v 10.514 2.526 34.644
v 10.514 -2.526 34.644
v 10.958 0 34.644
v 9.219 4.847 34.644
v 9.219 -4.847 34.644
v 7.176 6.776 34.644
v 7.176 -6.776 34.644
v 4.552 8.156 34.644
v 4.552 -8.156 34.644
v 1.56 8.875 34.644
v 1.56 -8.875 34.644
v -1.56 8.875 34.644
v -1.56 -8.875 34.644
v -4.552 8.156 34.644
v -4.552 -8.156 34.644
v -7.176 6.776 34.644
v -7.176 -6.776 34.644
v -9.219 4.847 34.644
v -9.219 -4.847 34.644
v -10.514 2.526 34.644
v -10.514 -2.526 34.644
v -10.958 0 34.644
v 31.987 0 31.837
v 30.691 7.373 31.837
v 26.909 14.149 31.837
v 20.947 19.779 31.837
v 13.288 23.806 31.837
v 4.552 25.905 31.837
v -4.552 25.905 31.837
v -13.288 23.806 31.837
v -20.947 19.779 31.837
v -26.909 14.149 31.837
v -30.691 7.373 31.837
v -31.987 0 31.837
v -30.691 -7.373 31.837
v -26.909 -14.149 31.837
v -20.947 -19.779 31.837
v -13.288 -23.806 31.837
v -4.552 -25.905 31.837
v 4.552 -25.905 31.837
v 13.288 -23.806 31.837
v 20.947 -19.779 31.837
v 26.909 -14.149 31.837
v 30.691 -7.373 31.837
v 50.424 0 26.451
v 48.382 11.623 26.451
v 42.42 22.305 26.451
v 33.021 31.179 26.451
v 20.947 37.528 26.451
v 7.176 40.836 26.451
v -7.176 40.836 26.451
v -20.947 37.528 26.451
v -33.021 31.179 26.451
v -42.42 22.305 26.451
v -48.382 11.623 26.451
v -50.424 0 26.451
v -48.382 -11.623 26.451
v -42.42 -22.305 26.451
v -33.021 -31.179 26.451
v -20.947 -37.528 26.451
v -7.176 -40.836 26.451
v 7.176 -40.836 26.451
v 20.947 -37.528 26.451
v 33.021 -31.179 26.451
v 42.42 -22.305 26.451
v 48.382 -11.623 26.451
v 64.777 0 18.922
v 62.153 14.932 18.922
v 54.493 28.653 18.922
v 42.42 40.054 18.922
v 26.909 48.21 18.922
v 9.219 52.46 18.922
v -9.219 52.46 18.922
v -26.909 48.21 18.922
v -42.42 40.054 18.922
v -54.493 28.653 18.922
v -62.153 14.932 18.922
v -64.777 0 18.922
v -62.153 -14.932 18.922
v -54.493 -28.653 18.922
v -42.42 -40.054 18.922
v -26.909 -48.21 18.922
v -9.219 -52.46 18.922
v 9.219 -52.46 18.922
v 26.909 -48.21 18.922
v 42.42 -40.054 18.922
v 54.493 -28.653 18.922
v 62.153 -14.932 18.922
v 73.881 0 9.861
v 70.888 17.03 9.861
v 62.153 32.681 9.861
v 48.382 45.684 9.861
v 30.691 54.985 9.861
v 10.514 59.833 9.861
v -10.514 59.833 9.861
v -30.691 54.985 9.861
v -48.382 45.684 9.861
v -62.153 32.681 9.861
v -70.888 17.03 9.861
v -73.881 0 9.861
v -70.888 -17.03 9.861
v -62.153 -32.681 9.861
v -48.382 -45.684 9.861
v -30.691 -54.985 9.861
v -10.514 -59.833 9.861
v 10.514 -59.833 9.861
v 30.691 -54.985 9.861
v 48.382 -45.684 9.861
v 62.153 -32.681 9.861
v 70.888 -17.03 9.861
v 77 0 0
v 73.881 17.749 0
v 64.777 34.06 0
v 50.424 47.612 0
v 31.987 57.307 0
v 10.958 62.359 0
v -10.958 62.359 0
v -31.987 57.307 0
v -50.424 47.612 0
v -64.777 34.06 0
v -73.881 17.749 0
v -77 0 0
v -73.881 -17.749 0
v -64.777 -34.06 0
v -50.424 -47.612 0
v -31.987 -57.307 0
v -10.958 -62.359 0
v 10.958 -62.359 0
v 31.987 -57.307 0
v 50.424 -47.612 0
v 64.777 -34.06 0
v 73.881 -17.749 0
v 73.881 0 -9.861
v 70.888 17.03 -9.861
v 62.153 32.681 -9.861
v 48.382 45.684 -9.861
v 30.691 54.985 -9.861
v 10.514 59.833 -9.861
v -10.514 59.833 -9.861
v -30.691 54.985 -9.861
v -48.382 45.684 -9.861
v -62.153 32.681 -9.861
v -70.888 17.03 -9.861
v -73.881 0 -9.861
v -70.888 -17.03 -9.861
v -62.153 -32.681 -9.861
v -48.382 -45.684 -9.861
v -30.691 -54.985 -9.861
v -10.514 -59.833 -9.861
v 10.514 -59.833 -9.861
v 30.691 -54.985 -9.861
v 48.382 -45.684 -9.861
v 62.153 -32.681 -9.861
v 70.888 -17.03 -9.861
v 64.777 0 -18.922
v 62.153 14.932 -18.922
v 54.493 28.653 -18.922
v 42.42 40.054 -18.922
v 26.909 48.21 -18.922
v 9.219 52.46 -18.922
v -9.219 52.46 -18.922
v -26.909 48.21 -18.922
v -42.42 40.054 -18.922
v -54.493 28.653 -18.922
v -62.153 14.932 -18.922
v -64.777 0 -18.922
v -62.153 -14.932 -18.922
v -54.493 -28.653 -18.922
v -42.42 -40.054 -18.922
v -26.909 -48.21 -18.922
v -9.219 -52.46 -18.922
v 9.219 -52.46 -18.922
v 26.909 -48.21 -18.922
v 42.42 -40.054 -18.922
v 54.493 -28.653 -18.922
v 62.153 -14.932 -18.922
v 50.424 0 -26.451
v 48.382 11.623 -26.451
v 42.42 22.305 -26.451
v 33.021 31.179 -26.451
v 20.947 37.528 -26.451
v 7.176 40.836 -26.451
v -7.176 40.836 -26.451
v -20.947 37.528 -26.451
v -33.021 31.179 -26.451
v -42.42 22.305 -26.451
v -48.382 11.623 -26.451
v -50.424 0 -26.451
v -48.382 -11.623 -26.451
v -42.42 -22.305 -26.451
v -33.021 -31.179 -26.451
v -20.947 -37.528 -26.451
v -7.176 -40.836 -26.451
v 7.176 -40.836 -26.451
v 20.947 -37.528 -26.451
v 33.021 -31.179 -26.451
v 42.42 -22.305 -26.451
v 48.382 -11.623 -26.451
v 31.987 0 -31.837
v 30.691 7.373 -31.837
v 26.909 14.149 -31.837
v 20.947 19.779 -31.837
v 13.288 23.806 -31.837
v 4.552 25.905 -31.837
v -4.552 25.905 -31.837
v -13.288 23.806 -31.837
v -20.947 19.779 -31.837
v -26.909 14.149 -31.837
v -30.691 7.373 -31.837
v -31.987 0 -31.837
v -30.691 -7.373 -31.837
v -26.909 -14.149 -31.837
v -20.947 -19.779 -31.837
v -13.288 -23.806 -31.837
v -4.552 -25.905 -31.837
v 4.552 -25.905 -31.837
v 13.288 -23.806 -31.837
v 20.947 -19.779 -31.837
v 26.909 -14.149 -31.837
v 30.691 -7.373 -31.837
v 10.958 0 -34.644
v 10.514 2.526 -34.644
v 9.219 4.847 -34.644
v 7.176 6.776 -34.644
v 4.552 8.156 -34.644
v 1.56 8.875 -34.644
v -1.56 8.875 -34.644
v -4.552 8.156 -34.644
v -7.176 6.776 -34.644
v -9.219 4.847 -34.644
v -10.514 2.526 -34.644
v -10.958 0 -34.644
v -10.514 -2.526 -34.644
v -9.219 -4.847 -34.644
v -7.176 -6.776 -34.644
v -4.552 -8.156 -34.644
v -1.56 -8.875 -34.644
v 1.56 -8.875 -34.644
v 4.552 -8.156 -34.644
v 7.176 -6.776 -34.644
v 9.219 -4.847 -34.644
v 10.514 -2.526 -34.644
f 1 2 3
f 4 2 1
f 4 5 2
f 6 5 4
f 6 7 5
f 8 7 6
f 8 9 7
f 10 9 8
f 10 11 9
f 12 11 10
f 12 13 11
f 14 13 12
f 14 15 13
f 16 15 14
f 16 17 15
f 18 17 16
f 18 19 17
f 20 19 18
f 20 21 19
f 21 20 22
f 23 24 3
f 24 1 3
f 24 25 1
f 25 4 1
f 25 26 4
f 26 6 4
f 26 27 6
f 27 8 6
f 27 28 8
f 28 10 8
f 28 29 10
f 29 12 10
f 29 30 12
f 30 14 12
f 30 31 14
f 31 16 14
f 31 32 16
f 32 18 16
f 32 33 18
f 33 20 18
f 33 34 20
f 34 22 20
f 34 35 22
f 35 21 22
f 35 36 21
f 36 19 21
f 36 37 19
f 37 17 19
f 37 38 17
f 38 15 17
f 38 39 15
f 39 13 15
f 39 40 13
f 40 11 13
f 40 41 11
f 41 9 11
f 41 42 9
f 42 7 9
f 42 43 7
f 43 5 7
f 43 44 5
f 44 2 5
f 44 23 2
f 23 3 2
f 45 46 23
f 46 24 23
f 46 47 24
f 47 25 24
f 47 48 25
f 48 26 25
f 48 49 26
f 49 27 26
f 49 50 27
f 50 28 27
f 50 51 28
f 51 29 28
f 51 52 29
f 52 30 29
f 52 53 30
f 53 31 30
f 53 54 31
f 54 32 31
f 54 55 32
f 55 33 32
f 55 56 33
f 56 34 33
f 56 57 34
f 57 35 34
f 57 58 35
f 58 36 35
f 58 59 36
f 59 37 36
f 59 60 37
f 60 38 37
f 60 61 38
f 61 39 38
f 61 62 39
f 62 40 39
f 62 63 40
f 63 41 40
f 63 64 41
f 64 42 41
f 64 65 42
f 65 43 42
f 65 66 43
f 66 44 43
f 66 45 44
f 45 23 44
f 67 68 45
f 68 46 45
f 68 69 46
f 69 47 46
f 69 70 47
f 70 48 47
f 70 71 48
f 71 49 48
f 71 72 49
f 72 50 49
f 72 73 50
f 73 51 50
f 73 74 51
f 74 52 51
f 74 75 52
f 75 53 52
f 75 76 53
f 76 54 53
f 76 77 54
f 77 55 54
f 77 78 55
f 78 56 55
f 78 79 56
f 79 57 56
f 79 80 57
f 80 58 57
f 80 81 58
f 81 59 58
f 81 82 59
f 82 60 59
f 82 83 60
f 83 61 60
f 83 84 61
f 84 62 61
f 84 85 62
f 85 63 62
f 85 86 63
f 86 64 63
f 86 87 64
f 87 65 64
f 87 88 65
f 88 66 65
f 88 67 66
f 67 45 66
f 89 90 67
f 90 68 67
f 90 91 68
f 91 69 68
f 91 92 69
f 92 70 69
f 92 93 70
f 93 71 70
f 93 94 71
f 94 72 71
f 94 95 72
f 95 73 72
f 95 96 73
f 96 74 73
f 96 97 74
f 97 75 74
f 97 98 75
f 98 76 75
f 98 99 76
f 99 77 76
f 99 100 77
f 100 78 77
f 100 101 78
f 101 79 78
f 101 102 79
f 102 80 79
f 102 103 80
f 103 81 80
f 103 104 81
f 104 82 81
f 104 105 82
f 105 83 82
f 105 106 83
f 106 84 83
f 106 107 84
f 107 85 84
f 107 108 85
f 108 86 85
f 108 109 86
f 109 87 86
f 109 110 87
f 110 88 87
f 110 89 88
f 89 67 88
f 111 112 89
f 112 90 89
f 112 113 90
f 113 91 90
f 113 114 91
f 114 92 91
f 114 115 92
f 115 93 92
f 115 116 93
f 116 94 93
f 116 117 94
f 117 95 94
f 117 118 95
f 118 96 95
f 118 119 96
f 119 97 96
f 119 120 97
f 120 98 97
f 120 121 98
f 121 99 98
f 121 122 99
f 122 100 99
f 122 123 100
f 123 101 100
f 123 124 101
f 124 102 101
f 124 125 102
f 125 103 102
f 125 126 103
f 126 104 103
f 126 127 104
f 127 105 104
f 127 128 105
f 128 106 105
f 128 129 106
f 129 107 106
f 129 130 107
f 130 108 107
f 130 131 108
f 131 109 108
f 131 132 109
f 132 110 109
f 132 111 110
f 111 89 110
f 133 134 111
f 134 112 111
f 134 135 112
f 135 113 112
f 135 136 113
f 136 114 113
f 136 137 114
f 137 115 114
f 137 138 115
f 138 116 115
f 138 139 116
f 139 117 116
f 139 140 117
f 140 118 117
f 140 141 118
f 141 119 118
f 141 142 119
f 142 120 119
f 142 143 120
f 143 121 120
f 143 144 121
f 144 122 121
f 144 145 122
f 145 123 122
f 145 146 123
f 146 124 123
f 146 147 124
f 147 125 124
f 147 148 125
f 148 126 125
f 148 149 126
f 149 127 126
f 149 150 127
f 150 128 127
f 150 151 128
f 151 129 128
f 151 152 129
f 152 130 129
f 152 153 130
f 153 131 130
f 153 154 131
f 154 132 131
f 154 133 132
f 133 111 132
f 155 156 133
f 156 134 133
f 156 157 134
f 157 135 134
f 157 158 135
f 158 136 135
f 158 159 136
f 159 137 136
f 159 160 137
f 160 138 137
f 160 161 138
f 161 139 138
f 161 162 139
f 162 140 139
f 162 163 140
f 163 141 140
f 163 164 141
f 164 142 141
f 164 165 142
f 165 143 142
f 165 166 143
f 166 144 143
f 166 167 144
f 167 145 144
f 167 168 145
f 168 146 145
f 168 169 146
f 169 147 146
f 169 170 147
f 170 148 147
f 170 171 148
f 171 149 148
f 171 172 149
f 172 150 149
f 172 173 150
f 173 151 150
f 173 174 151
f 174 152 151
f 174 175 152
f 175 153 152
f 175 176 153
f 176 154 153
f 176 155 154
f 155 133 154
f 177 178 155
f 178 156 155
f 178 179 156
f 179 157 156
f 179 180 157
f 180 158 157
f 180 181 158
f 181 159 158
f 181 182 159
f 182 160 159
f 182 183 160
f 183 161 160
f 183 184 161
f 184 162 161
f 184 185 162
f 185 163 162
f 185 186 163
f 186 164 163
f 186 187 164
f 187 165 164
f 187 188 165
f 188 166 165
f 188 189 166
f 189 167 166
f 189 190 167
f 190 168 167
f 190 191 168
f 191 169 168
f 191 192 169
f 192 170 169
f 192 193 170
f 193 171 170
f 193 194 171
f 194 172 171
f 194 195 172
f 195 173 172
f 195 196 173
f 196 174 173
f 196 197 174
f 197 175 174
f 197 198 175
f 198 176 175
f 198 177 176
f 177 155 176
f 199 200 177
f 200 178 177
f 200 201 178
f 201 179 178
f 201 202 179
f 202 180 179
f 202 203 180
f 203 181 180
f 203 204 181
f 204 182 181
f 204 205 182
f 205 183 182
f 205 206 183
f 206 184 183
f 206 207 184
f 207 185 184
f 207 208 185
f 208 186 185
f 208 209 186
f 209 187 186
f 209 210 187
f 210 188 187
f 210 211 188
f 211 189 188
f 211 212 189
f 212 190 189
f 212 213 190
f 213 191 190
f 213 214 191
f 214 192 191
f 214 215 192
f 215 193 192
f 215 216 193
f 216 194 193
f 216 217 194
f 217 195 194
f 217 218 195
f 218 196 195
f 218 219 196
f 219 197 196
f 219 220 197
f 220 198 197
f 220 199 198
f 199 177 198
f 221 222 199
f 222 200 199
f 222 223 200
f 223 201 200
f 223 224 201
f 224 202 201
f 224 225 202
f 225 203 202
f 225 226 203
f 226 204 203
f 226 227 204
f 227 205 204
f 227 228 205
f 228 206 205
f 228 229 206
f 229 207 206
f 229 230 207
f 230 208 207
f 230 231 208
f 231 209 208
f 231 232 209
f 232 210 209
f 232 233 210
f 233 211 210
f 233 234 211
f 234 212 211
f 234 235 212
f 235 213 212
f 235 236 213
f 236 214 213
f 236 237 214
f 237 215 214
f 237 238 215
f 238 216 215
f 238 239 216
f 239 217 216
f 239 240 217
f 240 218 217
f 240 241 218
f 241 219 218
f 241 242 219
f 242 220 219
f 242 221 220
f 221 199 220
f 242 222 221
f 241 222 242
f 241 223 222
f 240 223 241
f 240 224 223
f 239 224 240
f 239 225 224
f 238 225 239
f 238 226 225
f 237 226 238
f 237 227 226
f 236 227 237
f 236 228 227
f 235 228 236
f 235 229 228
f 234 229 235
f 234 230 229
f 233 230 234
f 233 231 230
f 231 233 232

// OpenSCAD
// Generated by SolidPython 1.0.1 on 2020-07-29 00:46:49


scale(v = [11, 9, 5]) {
	sphere(r = 7);
}
/***********************************************
*********      SolidPython code:      **********
************************************************
 
# import packages: SolidPython
from solid import *
from solid.utils import *
from itertools import chain, combinations, permutations


class Resize:

    def __init__(self, scad_file):
        self.scad_file = scad_file
        #self.scad_file = import_scad(scad_file)
        # cone/cylinder param:
        self.r1 = 0
        self.r2 = 0
        self.h = 0
        # rectangular prism param:
        self.w = 0
        self.l = 0
        # ellipse param:
        self.r = 0

    # import OpenScad code (file name corresponds to shape)


    # classify shape + parameters
    def assign(self, param1, param2, param3):
        if self.scad_file == 'cone.scad':
            self.r1 = param1
            self.r2 = param2
            self.h = param3
        elif self.scad_file == 'cylinder.scad':
            self.r1 = param1
            self.r2 = param2
            self.h = param3
        elif self.scad_file == 'rectangularPrism.scad':
            self.h = param1
            self.l = param2
            self.w = param3
        else:
            self.r = param1
            self.h = param2

    # resize parameters
    def iterate(self):
        x = range(3, 20, 2)
        i = 1
        if self.scad_file == 'cone.scad':
            tempList = list(permutations(x, 2))
            for temp in tempList:
                param1 = temp[0]
                param2 = temp[1]
                filepath = 'produced_scad_files/' + 'cone' + str(param1) + '_' + str(param2) + '_' + '.scad'
                scad_render_to_file(cylinder(h=param1, r1=param2, r2=0), filepath)

        elif self.scad_file == 'cylinder.scad':
            tempList = list(permutations(x, 3))
            for temp in tempList:
                param1 = temp[0]
                param2 = temp[1]
                filepath = 'produced_scad_files/' + 'cylinder' + str(param1) + '_' + str(param2) + '_' + '.scad'
                scad_render_to_file(cylinder(h=param1, r1=param2, r2=param2), filepath)

        elif self.scad_file == 'rectangularPrism.scad':
            tempList = list(permutations(x, 3))
            for temp in tempList:
                param1 = temp[0]
                param2 = temp[1]
                param3 = temp[2]
                filepath = 'produced_scad_files/' + 'rectangularPrism' + str(param1) + '_' + str(param2) + '_' + str(
                    param3) + '.scad'
                scad_render_to_file(cube(size=(param1, param2, param3)), filepath)

        elif self.scad_file == 'ellipse.scad':
            tempList = list(permutations(x, 4))
            for temp in tempList:
                param1 = temp[0]
                param2 = temp[1]
                param3 = temp[2]
                param4 = temp[3]
                filepath = 'produced_scad_files/' + 'ellipse' + str(param1) + '_' + str(param2) + '_' + str(param3) + '_' + str(param4) + '.scad'
                scad_render_to_file(scale([param1, param2, param3])(sphere(r=param4)), filepath)

    def render_to_scadfile(self):
        scad_render_to_file(scad, 'example.scad') 
 
************************************************/
